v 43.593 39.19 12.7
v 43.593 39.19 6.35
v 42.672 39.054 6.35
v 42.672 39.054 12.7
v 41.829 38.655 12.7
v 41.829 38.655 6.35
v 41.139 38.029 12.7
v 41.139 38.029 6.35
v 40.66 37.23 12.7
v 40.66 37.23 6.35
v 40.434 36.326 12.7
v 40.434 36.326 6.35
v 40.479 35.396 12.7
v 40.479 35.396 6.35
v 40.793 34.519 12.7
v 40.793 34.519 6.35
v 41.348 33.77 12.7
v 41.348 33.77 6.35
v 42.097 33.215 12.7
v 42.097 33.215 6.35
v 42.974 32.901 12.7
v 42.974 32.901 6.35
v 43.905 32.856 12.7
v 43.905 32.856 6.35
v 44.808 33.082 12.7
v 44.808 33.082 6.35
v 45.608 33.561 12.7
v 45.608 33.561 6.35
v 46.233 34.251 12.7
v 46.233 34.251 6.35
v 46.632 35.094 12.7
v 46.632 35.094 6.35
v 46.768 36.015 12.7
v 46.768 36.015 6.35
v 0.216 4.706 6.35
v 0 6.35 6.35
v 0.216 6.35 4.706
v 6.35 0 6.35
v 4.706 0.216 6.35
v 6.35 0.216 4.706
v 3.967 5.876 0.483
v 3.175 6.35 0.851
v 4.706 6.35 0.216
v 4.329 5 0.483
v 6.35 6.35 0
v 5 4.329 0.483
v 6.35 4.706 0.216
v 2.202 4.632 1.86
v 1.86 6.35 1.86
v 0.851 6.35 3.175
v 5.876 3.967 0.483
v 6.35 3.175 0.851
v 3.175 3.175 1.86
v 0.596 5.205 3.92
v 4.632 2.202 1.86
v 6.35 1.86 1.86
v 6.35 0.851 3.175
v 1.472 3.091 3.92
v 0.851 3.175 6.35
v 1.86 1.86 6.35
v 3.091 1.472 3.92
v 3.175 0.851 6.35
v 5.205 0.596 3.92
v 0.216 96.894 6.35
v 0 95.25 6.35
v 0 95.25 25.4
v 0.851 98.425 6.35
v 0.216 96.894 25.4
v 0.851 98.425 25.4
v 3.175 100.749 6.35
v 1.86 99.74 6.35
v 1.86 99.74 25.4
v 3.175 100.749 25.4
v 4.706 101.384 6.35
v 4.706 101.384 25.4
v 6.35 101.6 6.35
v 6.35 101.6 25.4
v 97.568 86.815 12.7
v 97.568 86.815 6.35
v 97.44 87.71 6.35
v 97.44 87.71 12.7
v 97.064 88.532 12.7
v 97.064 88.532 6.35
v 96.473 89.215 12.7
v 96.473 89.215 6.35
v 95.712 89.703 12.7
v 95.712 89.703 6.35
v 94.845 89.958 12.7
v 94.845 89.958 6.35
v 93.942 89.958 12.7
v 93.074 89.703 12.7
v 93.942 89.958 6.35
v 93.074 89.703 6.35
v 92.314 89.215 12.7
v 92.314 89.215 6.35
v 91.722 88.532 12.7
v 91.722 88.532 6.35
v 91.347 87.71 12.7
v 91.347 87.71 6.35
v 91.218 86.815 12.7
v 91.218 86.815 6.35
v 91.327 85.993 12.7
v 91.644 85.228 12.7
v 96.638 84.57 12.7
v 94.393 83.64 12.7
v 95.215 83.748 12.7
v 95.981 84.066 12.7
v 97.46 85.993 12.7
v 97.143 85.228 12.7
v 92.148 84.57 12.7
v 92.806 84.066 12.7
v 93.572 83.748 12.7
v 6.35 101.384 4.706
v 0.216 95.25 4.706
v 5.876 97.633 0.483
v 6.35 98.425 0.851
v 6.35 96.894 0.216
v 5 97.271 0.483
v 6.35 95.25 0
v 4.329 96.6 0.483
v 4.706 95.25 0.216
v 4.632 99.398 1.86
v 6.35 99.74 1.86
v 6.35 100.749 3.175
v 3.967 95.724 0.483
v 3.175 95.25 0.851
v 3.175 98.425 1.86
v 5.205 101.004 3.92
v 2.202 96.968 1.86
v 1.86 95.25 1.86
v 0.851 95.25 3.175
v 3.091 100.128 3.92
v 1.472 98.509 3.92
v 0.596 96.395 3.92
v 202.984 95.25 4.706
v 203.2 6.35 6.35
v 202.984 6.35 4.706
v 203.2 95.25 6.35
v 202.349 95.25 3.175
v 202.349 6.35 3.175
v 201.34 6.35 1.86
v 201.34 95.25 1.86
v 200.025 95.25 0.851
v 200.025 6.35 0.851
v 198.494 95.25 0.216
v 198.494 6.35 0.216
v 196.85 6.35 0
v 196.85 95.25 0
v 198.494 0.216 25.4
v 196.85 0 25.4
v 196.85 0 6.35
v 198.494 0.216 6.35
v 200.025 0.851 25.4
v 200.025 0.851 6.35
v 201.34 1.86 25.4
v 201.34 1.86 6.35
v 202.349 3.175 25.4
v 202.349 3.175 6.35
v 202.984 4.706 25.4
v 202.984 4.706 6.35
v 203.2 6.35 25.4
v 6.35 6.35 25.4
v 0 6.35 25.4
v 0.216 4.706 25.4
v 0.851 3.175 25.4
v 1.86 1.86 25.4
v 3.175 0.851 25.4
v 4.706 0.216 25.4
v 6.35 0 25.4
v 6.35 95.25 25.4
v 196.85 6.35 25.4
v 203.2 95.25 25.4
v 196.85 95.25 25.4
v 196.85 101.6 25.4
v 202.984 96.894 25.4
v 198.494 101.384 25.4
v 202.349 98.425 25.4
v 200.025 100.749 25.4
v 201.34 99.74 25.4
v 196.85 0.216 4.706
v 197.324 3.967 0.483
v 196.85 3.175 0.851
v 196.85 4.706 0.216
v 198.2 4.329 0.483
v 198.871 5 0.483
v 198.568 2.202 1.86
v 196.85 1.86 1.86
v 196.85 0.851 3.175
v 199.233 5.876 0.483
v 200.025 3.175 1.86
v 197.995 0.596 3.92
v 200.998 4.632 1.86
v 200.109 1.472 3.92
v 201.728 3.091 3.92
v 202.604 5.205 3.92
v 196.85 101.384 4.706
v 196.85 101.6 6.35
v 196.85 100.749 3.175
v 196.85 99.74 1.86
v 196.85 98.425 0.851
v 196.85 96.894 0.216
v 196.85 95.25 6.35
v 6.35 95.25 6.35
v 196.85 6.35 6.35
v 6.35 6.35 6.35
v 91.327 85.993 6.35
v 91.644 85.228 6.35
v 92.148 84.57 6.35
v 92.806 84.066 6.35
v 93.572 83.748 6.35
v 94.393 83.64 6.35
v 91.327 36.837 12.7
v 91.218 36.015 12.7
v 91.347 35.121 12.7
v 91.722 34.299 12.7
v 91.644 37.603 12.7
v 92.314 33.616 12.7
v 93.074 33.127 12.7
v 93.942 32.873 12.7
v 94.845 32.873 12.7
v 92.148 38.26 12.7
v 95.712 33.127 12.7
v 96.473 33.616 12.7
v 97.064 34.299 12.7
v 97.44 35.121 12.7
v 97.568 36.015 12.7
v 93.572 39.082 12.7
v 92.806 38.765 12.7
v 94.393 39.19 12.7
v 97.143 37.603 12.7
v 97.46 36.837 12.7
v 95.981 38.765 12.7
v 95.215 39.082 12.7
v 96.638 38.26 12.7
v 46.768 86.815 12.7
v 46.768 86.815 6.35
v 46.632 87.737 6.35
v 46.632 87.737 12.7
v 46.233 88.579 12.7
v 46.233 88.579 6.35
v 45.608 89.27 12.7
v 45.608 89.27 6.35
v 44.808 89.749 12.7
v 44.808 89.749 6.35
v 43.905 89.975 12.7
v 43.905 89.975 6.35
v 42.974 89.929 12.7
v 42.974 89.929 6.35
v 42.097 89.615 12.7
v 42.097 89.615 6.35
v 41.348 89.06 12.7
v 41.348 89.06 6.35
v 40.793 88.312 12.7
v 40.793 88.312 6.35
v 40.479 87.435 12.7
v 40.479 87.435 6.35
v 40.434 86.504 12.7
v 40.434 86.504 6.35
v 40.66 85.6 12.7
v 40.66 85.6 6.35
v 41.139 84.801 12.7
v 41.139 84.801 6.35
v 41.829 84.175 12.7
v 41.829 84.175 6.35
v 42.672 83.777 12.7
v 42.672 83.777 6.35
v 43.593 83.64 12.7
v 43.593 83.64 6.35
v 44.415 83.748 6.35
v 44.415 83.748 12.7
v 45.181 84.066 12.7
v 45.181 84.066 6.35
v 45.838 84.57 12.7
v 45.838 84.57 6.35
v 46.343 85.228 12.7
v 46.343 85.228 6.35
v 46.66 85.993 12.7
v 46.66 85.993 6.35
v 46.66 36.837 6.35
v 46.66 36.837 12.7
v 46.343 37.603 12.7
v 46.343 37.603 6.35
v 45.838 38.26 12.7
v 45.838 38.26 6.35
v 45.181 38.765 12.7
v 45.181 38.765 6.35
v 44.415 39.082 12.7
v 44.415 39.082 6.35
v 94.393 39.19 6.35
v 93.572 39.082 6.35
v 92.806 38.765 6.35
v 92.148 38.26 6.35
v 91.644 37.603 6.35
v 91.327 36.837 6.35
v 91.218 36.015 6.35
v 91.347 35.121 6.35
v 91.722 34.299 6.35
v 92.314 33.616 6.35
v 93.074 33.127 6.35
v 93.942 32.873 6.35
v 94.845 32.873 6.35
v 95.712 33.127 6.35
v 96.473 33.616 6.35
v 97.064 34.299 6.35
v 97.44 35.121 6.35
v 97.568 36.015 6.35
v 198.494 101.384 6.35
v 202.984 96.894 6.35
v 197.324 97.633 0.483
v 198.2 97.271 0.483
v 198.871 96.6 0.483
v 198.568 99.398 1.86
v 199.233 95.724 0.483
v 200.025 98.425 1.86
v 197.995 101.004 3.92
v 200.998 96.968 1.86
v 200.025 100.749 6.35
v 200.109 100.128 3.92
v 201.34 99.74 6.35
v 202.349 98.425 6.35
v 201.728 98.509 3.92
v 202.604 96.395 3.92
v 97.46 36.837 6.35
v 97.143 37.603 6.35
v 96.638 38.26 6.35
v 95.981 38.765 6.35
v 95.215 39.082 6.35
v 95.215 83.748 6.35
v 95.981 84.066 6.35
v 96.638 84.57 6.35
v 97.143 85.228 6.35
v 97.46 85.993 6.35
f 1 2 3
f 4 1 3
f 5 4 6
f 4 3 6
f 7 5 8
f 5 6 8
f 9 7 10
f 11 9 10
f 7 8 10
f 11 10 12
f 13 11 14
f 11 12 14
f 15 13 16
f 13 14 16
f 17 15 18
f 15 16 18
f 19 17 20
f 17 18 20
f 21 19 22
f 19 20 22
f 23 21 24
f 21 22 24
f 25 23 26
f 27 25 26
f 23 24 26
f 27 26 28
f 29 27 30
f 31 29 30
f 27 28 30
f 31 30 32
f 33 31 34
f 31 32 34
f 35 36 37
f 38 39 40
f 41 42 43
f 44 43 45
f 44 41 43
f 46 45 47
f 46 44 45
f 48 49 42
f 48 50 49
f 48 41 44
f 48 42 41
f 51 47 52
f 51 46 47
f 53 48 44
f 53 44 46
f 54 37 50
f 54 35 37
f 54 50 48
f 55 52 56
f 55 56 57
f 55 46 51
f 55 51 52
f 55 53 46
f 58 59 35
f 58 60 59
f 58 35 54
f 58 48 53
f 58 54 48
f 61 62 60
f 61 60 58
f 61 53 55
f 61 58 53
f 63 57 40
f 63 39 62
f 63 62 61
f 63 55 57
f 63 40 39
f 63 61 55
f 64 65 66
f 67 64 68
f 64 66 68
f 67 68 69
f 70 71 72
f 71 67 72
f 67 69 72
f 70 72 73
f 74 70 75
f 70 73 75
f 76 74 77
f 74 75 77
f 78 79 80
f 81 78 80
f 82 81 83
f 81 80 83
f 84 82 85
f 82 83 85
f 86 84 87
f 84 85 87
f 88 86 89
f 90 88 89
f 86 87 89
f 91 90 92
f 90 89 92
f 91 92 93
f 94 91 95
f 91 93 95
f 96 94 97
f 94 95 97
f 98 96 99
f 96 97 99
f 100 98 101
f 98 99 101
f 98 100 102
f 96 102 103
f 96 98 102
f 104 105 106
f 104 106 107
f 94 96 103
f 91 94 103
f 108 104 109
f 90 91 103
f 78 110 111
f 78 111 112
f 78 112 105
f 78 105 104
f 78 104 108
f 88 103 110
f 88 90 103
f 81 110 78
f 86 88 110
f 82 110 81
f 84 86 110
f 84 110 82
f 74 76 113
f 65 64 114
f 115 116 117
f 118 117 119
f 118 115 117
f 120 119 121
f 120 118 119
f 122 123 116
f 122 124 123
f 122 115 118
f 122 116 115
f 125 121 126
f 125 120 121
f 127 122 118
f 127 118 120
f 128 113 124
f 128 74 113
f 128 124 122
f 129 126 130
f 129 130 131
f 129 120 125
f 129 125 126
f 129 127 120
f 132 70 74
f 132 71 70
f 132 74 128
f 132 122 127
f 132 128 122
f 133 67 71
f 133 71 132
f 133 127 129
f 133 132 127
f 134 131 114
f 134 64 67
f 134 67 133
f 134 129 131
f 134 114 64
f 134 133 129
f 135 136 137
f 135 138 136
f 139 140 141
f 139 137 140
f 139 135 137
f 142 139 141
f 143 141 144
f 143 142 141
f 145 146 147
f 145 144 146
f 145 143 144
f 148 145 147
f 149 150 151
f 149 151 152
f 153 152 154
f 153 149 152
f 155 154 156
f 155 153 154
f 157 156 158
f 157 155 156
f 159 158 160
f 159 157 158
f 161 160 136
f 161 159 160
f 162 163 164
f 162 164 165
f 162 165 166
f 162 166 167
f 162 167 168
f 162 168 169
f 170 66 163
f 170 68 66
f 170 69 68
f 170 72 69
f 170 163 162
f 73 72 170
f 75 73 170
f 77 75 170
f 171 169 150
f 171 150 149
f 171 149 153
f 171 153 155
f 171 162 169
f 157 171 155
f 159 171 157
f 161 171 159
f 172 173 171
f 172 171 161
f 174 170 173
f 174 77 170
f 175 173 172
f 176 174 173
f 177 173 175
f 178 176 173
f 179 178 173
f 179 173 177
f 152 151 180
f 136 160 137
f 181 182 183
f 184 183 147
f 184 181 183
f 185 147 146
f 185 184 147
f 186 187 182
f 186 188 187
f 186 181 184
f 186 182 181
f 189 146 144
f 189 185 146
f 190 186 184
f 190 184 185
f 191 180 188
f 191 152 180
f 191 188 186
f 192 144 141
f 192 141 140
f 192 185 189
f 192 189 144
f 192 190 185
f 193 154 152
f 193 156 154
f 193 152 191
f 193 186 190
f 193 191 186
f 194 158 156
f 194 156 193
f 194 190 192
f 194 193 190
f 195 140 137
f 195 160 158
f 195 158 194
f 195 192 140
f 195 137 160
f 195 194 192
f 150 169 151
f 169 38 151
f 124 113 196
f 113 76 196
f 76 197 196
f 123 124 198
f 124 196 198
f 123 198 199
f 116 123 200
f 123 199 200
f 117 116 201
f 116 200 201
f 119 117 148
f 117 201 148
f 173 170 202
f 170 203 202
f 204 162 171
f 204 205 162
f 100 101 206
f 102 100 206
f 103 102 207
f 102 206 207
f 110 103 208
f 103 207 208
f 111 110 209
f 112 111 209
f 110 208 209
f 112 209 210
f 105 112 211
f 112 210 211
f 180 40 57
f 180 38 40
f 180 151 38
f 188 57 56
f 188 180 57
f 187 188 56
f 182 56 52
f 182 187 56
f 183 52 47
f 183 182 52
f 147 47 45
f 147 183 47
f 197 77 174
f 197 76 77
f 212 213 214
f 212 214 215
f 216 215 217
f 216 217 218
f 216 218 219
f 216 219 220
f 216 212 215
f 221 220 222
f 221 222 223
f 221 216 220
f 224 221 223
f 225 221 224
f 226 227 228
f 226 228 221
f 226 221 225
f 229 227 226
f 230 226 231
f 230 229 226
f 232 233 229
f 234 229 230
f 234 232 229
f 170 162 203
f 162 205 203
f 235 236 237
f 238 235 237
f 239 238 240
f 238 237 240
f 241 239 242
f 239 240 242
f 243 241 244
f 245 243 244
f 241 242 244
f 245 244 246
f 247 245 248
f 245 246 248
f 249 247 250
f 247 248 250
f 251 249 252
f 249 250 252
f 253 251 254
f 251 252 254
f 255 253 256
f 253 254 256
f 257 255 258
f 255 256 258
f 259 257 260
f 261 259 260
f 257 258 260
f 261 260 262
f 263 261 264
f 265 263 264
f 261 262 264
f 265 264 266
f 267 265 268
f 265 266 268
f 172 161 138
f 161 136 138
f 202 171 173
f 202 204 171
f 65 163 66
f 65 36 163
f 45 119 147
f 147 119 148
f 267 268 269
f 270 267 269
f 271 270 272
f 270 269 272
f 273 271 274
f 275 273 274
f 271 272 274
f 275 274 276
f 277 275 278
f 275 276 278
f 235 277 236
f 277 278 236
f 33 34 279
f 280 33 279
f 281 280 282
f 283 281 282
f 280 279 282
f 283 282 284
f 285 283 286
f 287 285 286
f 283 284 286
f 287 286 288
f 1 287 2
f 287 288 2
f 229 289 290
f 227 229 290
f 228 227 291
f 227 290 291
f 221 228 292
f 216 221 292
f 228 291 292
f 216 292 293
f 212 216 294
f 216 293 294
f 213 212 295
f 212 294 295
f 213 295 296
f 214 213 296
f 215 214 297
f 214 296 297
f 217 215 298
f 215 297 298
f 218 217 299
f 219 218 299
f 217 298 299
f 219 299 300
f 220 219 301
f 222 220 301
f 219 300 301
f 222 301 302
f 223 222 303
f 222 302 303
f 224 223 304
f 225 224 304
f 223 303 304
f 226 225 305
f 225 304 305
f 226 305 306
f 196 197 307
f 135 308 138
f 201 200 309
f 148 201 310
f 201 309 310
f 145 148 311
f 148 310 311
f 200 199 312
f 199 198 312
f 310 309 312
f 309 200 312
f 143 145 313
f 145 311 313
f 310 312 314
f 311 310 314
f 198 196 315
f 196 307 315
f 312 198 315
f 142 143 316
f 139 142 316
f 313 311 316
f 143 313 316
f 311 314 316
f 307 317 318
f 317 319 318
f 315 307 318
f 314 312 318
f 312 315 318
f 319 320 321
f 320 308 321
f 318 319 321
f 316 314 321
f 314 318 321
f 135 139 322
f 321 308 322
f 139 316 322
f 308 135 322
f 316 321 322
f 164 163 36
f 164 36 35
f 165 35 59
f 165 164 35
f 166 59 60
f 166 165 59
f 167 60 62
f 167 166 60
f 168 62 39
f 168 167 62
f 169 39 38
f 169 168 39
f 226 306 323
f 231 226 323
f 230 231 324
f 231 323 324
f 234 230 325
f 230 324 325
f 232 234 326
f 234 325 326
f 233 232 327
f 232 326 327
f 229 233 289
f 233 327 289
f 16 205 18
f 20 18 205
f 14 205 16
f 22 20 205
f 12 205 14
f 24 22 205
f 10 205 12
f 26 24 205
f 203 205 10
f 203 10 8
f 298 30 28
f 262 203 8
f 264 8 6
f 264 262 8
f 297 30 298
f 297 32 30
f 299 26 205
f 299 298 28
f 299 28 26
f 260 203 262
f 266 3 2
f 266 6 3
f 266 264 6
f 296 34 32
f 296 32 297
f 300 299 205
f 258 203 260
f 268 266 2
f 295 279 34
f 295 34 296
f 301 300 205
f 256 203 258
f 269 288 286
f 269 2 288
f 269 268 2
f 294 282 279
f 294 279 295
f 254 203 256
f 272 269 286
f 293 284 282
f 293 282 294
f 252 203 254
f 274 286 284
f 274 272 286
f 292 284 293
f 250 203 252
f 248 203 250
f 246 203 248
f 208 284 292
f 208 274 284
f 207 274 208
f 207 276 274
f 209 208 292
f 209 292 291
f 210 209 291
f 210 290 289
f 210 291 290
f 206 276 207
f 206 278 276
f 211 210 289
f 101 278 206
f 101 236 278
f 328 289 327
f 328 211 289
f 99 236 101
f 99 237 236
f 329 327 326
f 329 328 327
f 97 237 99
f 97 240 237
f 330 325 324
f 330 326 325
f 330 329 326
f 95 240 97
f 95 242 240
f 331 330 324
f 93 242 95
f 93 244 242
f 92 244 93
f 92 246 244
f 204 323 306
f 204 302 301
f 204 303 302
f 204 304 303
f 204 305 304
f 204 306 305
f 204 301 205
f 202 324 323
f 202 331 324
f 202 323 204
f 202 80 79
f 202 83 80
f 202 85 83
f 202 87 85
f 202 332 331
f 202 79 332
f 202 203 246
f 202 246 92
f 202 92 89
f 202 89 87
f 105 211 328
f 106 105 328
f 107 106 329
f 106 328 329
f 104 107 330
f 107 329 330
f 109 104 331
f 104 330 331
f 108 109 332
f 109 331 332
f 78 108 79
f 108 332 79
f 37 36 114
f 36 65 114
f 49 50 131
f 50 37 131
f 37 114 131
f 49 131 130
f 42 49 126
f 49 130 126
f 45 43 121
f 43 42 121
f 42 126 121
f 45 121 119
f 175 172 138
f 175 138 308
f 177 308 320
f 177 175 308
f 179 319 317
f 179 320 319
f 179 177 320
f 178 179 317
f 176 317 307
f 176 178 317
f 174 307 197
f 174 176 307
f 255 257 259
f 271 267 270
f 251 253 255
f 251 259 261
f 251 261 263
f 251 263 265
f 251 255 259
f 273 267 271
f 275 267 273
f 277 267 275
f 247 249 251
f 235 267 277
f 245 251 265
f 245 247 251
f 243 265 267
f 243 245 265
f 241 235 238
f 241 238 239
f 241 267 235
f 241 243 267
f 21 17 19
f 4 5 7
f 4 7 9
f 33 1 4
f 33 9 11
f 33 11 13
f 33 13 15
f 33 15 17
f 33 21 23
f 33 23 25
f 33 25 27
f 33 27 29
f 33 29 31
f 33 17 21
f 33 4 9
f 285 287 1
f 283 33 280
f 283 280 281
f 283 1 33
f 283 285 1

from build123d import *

# Parameters (mm, degrees)
F0_W     = 203.2
F0_H     = 101.6
F1_DEPTH = 25.4
F2_R     = 6.35
F3_T     = 6.35
F5_DEPTH = 6.35


# Not quite as in the source:
# - a shell that OpenCascade refuses in one call is made with other operations: the cavity is built on its own and cut out


with BuildPart() as f1:
    # F0 (on Top) → F1 (new body)
    with BuildSketch(Plane.XY):
        with Locations((101.6, 50.8)):
            Rectangle(F0_W, F0_H)
    extrude(amount=F1_DEPTH)

    # F2
    f2_edges = [f1.edges().sort_by_distance(p)[0] for p in [
        (0, 0, 12.7),
        (203.2, 0, 12.7),
        (0, 101.6, 12.7),
        (203.2, 101.6, 12.7),
        (101.6, 101.6, 0),
        (0, 50.8, 0),
        (101.6, 0, 0),
        (203.2, 50.8, 0),
    ]]
    fillet(f2_edges, radius=F2_R)

    # F3: shell of thickness 6.35, made by hand


with BuildPart() as f3_core1:
    # F3_t2: copy of F1
    add(f1.part)

    # the walls: a layer under each face that stays
    f3_faces = [f3_core1.faces().sort_by_distance(p)[0] for p in [
        (0, 50.8, 15.875),
        (101.6, 101.6, 15.875),
        (101.6, 0, 15.875),
        (203.2, 50.8, 15.875),
        (101.6, 50.8, 0),
    ]]
    thicken(f3_faces, amount=-F3_T, mode=Mode.SUBTRACT)


with BuildPart() as f1_1:
    add(f1.part)

    # what is left inside the walls is the cavity
    f3_cavity = [f3_core1.part.solids().sort_by_distance(p)[0] for p in [
        (101.6, 35.983333, 25.3365),
    ]]
    add(f3_cavity, mode=Mode.SUBTRACT)

    # F4 (on face) → F5 (join)
    with BuildSketch(Plane.XY.offset(6.35)):
        with BuildLine():
            Line((43.5933910498, 86.815246595), (46.7683910498, 86.815246595))
            ThreePointArc((46.7683910498, 86.815246595), (41.3483270196, 89.0603106253), (43.5933910498, 83.640246595))
            Line((43.5933910498, 83.640246595), (43.5933910498, 86.815246595))
        make_face()
        with BuildLine():
            ThreePointArc((43.5933910498, 83.640246595), (45.8384550801, 84.5701825647), (46.7683910498, 86.815246595))
            Line((46.7683910498, 86.815246595), (43.5933910498, 86.815246595))
            Line((43.5933910498, 86.815246595), (43.5933910498, 83.640246595))
        make_face()
        with BuildLine():
            ThreePointArc((97.5683910498, 86.815246595), (94.3933910498, 89.990246595), (91.2183910498, 86.815246595))
            Line((91.2183910498, 86.815246595), (94.3933910498, 86.815246595))
            Line((94.3933910498, 86.815246595), (94.3933910498, 83.640246595))
            ThreePointArc((94.3933910498, 83.640246595), (96.6384550801, 84.5701825647), (97.5683910498, 86.815246595))
        make_face()
        with BuildLine():
            Line((94.3933910498, 86.815246595), (91.2183910498, 86.815246595))
            ThreePointArc((91.2183910498, 86.815246595), (92.1483270196, 84.5701825647), (94.3933910498, 83.640246595))
            Line((94.3933910498, 83.640246595), (94.3933910498, 86.815246595))
        make_face()
        with BuildLine():
            Line((94.3933910498, 36.015246595), (94.3933910498, 39.190246595))
            ThreePointArc((94.3933910498, 39.190246595), (92.1483270196, 38.2603106253), (91.2183910498, 36.015246595))
            Line((91.2183910498, 36.015246595), (94.3933910498, 36.015246595))
        make_face()
        with BuildLine():
            ThreePointArc((46.7683910498, 36.015246595), (45.8384550801, 38.2603106253), (43.5933910498, 39.190246595))
            Line((43.5933910498, 39.190246595), (43.5933910498, 36.015246595))
            Line((43.5933910498, 36.015246595), (46.7683910498, 36.015246595))
        make_face()
        with BuildLine():
            Line((43.5933910498, 36.015246595), (43.5933910498, 39.190246595))
            ThreePointArc((43.5933910498, 39.190246595), (41.3483270196, 33.7701825647), (46.7683910498, 36.015246595))
            Line((46.7683910498, 36.015246595), (43.5933910498, 36.015246595))
        make_face()
        with BuildLine():
            ThreePointArc((97.5683910498, 36.015246595), (96.6384550801, 38.2603106253), (94.3933910498, 39.190246595))
            Line((94.3933910498, 39.190246595), (94.3933910498, 36.015246595))
            Line((94.3933910498, 36.015246595), (91.2183910498, 36.015246595))
            ThreePointArc((91.2183910498, 36.015246595), (94.3933910498, 32.840246595), (97.5683910498, 36.015246595))
        make_face()
    extrude(amount=F5_DEPTH)


solid = f1_1.part
